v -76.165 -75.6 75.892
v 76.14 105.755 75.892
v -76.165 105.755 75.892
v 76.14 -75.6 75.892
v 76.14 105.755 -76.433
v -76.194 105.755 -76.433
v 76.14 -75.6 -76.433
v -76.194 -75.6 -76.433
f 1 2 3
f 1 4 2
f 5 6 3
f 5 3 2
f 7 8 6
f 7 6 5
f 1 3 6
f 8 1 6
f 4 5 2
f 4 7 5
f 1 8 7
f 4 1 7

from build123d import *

# Parameters (mm, degrees)
F1_DEPTH = 75.4149332643
F2_DEPTH = 4.9401391298
F3_DEPTH = 75.600117445
F4_DEPTH = 25.4


with BuildPart() as f1:
    # F0 (on Front) → F1 (new body)
    with BuildSketch(Plane.XZ):
        Polygon((76.1401206255, 75.89186728), (-76.165035367, 75.89186728), (-76.1935412884, -76.4331817627), (76.1401206255, -76.4331817627), align=None)
    extrude(amount=-F1_DEPTH)

    # F2 (add): faces of the model
    f2_faces = [f1.faces().sort_by_distance(p)[0] for p in [
        (-0.0195840734, 75.4149332643, -0.2730328228),
        (-0.0195840734, 0, -0.2730328228),
    ]]
    extrude(f2_faces, amount=F2_DEPTH, dir=(0, 1, 0))

    # F3 (add): a face of the model
    f3_faces = [f1.faces().sort_by_distance(p)[0] for p in [
        (-0.0195840734, 0, -0.2730328228),
    ]]
    extrude(f3_faces, amount=F3_DEPTH)

    # F4 (add): a face of the model
    f4_faces = [f1.faces().sort_by_distance(p)[0] for p in [
        (-0.0195840734, 80.355072394, -0.2730328228),
    ]]
    extrude(f4_faces, amount=F4_DEPTH)


solid = f1.part
